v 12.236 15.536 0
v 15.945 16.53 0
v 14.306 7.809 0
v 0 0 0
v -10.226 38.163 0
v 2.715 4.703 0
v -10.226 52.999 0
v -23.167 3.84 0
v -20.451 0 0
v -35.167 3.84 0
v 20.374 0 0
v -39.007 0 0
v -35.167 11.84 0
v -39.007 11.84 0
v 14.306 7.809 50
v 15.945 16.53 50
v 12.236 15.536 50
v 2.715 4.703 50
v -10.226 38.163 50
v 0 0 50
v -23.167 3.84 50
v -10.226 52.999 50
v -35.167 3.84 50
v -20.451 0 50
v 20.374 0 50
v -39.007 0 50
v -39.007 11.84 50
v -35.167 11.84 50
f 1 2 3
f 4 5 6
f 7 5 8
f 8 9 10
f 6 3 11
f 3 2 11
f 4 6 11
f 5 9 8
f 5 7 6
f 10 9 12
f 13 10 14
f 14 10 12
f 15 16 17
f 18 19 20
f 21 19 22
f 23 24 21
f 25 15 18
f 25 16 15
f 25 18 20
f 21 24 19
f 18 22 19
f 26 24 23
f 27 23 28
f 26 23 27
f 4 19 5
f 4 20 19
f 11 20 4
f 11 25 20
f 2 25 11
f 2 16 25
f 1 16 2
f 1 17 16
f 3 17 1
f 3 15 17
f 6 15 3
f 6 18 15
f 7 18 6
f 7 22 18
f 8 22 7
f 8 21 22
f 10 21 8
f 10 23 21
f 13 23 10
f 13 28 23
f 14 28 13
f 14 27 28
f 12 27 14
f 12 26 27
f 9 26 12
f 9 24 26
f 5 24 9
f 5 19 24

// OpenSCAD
thickness = 0.48*8;

phone_thickness = 12;
mount_height = 50;
mount_angle = 15;
mount_width = 50;
shelf_height = 8;

function m_rot(angle) = let(c = cos(angle), s = sin(angle)) [ 
    [ c, s ],
    [ -s, c ]
];


function mount_poly() = 
    let( 
        fw = thickness + phone_thickness + thickness, 
        rot = m_rot(mount_angle),
        mp = [ thickness, thickness + mount_height ] * rot,
        mpn = [ mp[0] - mount_height * sin(mount_angle), thickness ]
    ) 
    concat(
        [
            [0,0], 
            [ fw / cos(mount_angle),0]
        ],
        [
            [ fw, thickness + shelf_height ],
            [ thickness + phone_thickness, thickness + shelf_height ],
            [ thickness + phone_thickness, thickness ],
            [ thickness, thickness ]
        ] * rot,
        [
            mp,
            mpn,
            [ mpn[0] - phone_thickness, mpn[1] ],
            [ mpn[0] - phone_thickness, mpn[1] + shelf_height ],
            [ mpn[0] - phone_thickness - thickness, mpn[1] + shelf_height ],
            [ mpn[0] - phone_thickness - thickness, 0 ],
            [ mp[0] * 2, 0 ],
            [ mp[0], -mp[0] * sin(90 - mount_angle) / sin(mount_angle) ]
        ]
    );



module mount_shape() {
    polygon(mount_poly());
}


module mount() {


    linear_extrude(mount_width)
    mount_shape();

}

module demo() {
    
    translate([mount_width/2,0,0])
    rotate([90,0,0])
    rotate([0,-90,0])
    mount();

}

mount();
